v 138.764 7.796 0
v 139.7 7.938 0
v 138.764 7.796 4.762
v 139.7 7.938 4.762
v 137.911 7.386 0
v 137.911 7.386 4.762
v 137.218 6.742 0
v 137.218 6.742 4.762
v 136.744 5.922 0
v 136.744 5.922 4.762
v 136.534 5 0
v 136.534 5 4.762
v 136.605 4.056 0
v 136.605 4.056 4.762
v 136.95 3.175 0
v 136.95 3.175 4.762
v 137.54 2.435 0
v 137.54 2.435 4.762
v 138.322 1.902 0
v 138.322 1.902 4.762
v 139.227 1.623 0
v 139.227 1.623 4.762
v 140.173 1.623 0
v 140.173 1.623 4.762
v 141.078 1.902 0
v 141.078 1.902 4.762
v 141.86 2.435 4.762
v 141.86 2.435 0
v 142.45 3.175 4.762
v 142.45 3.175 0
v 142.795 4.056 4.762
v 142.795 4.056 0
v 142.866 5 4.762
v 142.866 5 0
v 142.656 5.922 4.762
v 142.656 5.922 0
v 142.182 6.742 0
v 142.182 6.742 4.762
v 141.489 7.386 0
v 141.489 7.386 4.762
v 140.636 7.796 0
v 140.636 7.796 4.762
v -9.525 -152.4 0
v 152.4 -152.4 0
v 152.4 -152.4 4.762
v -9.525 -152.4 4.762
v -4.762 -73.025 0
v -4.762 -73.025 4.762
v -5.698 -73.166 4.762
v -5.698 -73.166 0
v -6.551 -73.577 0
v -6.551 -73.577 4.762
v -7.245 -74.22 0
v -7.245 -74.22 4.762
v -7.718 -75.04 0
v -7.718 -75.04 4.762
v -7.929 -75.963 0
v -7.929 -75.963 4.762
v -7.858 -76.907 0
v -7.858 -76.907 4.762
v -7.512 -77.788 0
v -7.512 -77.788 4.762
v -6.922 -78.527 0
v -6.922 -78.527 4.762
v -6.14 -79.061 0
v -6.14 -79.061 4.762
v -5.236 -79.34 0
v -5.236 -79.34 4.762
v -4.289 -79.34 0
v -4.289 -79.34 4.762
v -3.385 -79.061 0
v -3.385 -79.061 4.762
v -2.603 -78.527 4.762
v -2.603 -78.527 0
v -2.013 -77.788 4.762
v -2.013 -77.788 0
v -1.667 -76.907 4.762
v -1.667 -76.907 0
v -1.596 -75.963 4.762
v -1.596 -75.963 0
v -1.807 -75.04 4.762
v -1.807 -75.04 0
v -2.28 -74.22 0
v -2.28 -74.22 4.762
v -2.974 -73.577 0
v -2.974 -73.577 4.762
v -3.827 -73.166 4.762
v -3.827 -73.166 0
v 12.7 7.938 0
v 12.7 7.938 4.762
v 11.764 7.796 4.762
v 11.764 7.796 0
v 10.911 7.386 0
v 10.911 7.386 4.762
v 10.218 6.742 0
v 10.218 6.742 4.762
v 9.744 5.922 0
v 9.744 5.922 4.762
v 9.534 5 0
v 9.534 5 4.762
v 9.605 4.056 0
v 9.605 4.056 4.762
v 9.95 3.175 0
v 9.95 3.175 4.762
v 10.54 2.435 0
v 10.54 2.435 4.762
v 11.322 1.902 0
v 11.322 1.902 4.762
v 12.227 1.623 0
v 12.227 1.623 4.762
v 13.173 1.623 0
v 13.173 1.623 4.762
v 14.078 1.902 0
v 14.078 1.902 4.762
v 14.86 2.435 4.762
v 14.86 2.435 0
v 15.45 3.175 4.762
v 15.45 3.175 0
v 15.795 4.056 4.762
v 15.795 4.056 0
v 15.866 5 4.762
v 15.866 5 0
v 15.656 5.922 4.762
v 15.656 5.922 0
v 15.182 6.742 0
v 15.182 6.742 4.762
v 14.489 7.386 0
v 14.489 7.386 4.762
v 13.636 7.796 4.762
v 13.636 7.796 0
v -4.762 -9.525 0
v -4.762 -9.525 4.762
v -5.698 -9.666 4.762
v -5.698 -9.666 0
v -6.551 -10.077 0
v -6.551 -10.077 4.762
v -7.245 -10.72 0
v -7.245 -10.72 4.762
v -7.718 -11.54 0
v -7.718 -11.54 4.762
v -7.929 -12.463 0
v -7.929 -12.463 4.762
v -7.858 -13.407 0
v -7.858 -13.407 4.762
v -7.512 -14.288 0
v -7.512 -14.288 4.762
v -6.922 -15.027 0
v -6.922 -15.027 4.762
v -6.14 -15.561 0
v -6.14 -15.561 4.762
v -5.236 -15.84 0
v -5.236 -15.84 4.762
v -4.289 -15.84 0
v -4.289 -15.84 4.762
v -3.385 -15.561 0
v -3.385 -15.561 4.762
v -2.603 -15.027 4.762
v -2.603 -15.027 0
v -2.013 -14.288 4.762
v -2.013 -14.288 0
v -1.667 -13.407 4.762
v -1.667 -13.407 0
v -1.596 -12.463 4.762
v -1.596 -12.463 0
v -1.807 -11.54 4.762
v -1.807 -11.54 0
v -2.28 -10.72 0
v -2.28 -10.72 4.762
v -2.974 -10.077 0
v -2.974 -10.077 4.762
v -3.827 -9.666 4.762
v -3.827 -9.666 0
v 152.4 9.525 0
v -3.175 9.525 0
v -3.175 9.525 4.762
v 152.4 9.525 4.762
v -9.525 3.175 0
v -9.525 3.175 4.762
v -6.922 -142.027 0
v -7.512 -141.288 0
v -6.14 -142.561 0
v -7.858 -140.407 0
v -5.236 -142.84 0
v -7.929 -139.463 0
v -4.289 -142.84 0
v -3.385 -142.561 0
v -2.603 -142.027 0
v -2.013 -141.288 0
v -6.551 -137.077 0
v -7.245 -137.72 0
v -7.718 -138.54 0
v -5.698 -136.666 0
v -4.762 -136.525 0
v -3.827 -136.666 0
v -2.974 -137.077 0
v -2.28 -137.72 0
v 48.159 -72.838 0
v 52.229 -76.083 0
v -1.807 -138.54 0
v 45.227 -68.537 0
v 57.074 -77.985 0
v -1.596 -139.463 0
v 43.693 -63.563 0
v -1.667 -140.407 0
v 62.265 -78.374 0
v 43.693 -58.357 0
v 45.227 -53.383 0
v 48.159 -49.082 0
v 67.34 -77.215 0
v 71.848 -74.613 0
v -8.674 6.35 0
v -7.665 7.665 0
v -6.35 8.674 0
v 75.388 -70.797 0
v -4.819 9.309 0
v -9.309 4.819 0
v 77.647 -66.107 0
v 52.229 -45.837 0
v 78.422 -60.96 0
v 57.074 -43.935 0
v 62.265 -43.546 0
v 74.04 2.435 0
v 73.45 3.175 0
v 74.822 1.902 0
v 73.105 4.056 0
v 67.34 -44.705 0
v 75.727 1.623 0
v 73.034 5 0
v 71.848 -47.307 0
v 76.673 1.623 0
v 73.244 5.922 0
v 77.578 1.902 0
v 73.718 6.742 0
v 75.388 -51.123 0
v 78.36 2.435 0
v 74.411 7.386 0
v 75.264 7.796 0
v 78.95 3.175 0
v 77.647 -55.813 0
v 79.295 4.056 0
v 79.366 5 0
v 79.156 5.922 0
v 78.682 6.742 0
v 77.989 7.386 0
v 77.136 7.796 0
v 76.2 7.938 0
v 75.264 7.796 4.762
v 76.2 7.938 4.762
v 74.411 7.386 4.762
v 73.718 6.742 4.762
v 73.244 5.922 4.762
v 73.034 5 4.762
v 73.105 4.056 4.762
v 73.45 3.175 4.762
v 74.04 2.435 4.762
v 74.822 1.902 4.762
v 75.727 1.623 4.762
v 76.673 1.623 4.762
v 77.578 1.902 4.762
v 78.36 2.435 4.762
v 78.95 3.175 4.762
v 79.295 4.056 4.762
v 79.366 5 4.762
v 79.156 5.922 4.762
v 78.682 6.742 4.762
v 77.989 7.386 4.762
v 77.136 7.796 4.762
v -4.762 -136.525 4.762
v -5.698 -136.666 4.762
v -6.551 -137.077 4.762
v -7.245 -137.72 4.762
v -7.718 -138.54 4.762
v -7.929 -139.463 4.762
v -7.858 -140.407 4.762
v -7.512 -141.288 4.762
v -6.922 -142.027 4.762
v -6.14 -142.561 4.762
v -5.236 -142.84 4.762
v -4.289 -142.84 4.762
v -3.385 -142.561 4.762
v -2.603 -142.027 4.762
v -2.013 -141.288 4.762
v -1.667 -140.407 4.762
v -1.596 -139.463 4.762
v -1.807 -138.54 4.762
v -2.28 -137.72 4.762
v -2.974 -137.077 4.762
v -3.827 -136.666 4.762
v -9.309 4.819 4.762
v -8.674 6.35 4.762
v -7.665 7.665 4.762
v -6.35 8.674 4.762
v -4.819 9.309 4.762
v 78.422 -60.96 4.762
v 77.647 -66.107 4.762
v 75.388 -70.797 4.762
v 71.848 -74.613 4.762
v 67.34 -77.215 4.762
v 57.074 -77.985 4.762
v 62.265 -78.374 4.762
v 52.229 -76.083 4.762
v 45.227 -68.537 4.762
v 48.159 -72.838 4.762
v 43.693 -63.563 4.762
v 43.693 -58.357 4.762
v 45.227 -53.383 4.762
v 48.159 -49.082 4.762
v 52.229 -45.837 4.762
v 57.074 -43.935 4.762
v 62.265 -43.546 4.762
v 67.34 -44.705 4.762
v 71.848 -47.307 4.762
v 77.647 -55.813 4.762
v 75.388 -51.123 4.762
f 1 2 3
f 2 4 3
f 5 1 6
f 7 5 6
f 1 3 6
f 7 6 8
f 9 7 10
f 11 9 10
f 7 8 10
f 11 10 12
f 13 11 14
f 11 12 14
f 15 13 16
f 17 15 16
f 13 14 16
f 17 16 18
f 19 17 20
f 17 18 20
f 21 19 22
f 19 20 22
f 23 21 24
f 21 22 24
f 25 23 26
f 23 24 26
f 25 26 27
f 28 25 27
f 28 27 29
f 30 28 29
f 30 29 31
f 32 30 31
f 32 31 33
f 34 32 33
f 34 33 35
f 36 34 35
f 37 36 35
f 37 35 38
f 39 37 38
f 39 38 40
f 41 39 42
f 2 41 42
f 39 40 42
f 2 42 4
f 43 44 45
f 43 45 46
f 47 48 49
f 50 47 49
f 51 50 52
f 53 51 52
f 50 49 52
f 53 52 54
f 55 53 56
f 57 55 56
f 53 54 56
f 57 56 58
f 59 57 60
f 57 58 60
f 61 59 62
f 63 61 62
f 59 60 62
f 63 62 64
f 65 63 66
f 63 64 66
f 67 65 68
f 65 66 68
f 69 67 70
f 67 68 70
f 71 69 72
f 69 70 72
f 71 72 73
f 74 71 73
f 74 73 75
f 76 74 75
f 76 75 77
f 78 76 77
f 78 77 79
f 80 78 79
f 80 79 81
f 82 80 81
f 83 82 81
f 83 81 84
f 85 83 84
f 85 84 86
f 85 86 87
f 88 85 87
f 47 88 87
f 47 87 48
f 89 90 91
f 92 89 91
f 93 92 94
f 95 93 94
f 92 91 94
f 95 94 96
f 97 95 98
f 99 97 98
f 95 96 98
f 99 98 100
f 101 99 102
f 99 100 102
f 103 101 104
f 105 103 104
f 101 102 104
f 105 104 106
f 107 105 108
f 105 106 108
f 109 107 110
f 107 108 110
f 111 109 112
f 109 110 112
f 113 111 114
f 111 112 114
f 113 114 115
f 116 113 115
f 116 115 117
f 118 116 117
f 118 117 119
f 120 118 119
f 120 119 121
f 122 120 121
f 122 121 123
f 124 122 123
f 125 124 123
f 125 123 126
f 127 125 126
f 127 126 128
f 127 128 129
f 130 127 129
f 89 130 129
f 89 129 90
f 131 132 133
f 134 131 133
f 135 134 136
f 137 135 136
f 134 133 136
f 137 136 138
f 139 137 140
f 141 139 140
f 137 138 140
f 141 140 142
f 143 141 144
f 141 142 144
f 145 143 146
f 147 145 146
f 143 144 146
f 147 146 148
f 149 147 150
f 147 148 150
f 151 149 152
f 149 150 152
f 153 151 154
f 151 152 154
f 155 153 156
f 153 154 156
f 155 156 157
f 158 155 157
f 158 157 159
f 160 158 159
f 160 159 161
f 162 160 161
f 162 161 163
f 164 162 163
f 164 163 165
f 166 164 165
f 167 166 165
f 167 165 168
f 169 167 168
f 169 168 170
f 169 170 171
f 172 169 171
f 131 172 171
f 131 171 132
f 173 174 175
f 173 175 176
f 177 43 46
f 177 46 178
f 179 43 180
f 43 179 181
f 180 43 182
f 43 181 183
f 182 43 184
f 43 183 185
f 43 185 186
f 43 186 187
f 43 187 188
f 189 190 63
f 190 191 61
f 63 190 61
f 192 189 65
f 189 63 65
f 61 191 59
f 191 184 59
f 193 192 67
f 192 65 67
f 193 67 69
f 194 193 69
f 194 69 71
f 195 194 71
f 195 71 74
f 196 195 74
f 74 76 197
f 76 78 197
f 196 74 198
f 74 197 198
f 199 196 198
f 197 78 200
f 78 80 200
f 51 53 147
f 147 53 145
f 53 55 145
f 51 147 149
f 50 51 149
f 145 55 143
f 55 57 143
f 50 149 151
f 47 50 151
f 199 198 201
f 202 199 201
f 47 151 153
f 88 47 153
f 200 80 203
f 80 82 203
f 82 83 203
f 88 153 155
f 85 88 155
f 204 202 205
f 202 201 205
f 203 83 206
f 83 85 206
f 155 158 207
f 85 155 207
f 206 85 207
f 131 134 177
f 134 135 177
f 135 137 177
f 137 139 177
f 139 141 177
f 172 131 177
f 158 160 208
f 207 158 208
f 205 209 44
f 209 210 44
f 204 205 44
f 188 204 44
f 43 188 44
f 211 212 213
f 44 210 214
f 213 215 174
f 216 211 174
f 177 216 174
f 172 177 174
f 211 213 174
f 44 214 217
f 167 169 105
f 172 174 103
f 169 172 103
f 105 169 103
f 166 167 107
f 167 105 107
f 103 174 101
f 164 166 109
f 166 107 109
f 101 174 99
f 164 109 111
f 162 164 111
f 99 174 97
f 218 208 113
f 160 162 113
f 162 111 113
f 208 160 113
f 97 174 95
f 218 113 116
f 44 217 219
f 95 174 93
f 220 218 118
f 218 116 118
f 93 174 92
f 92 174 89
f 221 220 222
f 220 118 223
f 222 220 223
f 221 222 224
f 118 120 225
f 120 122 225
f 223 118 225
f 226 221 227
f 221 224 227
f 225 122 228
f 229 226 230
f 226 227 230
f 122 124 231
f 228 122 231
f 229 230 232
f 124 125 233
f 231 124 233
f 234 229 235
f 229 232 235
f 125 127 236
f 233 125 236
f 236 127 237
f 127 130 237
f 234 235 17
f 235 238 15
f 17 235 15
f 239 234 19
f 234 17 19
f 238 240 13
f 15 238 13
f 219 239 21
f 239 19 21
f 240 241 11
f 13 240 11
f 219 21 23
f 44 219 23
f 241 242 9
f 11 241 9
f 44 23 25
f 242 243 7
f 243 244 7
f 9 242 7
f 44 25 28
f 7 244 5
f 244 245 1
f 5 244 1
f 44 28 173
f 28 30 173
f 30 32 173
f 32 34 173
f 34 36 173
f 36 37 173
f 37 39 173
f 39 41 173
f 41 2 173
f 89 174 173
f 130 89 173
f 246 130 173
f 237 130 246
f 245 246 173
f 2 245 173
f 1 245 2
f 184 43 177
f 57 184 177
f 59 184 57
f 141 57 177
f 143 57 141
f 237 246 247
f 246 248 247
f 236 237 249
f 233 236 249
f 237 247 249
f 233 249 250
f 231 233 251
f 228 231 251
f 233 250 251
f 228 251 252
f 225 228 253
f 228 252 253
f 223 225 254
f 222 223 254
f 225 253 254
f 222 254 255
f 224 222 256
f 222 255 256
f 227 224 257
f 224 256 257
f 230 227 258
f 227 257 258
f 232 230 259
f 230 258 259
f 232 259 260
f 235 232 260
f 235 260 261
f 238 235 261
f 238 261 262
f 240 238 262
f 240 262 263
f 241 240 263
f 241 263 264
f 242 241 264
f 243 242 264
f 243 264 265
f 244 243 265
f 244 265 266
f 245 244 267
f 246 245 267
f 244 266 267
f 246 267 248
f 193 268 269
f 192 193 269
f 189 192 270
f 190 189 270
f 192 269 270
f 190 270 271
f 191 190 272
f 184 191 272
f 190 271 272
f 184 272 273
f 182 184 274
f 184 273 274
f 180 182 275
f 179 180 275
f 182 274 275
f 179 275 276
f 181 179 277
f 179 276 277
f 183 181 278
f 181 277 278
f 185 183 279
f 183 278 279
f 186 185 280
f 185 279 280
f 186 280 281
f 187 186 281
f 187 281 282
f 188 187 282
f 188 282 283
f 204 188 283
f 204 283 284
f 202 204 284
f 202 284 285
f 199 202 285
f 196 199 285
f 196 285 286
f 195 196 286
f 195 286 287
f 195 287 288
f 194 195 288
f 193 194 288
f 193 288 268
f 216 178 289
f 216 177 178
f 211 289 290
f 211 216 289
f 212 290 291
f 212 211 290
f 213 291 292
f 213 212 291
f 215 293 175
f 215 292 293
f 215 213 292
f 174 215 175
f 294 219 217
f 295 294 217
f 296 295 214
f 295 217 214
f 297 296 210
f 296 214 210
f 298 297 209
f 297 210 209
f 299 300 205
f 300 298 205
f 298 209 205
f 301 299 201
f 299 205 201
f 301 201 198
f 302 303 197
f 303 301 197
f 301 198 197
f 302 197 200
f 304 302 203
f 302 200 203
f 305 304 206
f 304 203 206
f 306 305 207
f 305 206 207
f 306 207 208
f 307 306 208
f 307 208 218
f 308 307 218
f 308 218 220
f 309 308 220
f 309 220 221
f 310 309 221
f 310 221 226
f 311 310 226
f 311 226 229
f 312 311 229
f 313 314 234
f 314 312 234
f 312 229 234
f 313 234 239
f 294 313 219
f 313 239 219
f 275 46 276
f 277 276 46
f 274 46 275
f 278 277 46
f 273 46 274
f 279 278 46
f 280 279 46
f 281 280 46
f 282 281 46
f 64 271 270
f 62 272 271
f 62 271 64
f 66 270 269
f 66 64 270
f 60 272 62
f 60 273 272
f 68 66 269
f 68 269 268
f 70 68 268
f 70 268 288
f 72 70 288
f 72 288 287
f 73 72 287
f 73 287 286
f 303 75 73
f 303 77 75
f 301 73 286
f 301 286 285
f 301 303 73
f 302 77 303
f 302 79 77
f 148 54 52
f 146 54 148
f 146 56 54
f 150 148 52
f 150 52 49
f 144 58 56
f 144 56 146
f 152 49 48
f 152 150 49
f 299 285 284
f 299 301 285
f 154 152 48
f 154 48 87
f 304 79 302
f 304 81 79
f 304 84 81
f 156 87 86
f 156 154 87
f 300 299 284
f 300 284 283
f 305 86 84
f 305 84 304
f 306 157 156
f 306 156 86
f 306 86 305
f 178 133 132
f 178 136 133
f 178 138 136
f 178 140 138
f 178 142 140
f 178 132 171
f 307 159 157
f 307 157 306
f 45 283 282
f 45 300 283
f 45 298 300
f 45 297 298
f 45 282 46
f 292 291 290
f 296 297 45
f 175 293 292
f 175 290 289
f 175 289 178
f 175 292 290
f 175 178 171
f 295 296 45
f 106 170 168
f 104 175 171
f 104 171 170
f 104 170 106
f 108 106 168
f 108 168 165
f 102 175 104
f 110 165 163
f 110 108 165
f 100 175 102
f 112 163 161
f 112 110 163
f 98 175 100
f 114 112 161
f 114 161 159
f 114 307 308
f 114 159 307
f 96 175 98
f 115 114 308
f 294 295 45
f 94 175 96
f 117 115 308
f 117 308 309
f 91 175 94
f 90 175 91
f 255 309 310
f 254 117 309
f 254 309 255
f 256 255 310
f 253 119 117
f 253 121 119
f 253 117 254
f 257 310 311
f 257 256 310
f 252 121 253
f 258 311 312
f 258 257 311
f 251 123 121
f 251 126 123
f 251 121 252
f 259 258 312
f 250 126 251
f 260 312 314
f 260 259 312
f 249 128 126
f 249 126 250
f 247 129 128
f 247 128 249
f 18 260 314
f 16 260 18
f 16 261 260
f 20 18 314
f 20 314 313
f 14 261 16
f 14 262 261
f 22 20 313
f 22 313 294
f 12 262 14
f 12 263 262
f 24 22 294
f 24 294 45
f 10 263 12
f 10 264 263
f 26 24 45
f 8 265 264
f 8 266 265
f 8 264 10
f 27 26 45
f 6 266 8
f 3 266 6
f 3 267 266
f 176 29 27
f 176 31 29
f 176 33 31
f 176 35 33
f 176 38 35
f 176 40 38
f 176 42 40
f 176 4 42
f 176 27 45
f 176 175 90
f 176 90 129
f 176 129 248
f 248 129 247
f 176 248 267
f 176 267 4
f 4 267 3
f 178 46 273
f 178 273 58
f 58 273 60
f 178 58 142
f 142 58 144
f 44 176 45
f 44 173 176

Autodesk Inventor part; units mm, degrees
ref_plane "YZ Plane" through (0, 0, 0) normal (1, 0, 0) x (0, 1, 0)
ref_plane "XZ Plane" through (0, 0, 0) normal (0, 1, 0) x (-1, 0, 0)
ref_plane "XY Plane" through (0, 0, 0) normal (0, 0, 1) x (1, 0, 0)
sketch "Sketch1" plane through (0, 0, 0) normal (0, 0, 1) x (1, 0, 0)
  line L0 (0, 0) -> (152.4, 0)
  line L1 (152.4, 0) -> (152.4, -152.4)
  line L2 (152.4, -152.4) -> (0, -152.4)
  line L3 (0, -152.4) -> (0, 0)
  line L4 (0, -152.4) -> (-50.8, -152.4) construction
  line L5 (-50.8, -152.4) -> (-50.8, 25.4) construction
  line L6 (0, 0) -> (0, -152.4)
  line L7 (-47.625, 25.4) -> (152.4, 25.4) construction
  line L8 (152.4, 25.4) -> (152.4, 0) construction
  line L9 (152.4, 0) -> (0, 0)
  line L10 (-47.625, 0) -> (-47.625, 25.4) construction
  line L11 (-50.8, -152.4) -> (-50.8, 25.4) construction
  line L12 (-50.8, 25.4) -> (-47.625, 25.4) construction
  circle A0 centre (60.96, -60.96) radius 54.61 construction
  circle A1 centre (60.96, -60.96) radius 53.34 construction
  circle A2 centre (60.96, -60.96) radius 17.4625
  line L13 (0, 0) -> (-47.625, 0) construction
  line L14 (0, -152.4) -> (-9.525, -152.4)
  line L15 (-9.525, -152.4) -> (-9.525, 3.175)
  line L16 (-3.175, 9.525) -> (152.4, 9.525)
  line L17 (152.4, 0) -> (152.4, 9.525)
  circle A3 centre (60.96, -60.96) radius 47.2059 construction
  line L18 (-4.7625, 9.525) -> (-4.7625, -152.4) construction
  line L19 (-9.525, 4.7625) -> (152.4, 4.7625) construction
  arc A4 (-3.175, 9.525) -> (-9.525, 3.175) centre (-3.175, 3.175) ccw
  circle A5 centre (26.1804, -128.9845) radius 19.25 construction
  circle A6 centre (122.9069, -124.7235) radius 31.75 construction
  circle A7 centre (122.9069, -124.7235) radius 25.4 construction
  circle A8 centre (141.1251, -107.0244) radius 2.4892 construction
  circle A9 centre (104.6888, -142.4226) radius 2.4892 construction
  line L20 (104.6888, -142.4226) -> (141.1251, -107.0244) construction
  circle A10 centre (60.96, -60.96) radius 57.15 construction
  line L21 (60.96, -60.96) -> (122.9069, -124.7235) construction
  circle A11 centre (73.4969, -121.9141) radius 8.89 construction
  circle A12 centre (73.4969, -121.9141) radius 25.4 construction
  circle A13 centre (41.2385, -108.5294) radius 9.525 construction
  circle A14 centre (41.2385, -108.5294) radius 19.05 construction
  circle A15 centre (26.1804, -128.9845) radius 6.35 construction
  point P0 (-9.525, 9.525)
  point P1 (12.7, 4.7625)
  point P2 (-4.7625, -12.7)
  point P3 (76.2, 4.7625)
  point P4 (139.7, 4.7625)
  point P5 (-4.7625, -76.2)
  point P6 (-4.7625, -139.7)
  dimension "d0" = 152.4
  dimension "d8" = 50.8
  dimension "d12" = 3.175
  dimension "d28" = 152.4
  dimension "d29" = 109.22
  dimension "d30" = 106.68
  dimension "d31" = 60.96
  dimension "d32" = 60.96
  dimension "d33" = 34.925
  dimension "d34" = 9.525
  dimension "d35" = 9.525
  dimension "d41" = 94.4118
  dimension "d42" = 25.4
  dimension "d43" = 22.225
  dimension "d44" = 22.225
  dimension "d45" = 6.35
  dimension "d48" = 63.5
  dimension "d55" = 63.5
  dimension "d67" = 38.5
  dimension "d68" = 63.5
  dimension "d69" = 50.8
  dimension "d70" = 4.9784
  dimension "d71" = 114.3
  dimension "d72" = 17.78
  dimension "d73" = 50.8
  dimension "d74" = 19.05
  dimension "d75" = 38.1
  dimension "d76" = 12.7
extrude "Extrusion1" add sketch "Sketch1" along normal blind 4.7625
hole "Hole1" at (12.7, 4.7625, 0) at (-4.7625, -12.7, 0) at (76.2, 4.7625, 0) at (139.7, 4.7625, 0) at (-4.7625, -76.2, 0) at (-4.7625, -139.7, 0) direction (0, 0, 1) diameter 6.35 end through all
properties part number "Module Plate - Bottom"
